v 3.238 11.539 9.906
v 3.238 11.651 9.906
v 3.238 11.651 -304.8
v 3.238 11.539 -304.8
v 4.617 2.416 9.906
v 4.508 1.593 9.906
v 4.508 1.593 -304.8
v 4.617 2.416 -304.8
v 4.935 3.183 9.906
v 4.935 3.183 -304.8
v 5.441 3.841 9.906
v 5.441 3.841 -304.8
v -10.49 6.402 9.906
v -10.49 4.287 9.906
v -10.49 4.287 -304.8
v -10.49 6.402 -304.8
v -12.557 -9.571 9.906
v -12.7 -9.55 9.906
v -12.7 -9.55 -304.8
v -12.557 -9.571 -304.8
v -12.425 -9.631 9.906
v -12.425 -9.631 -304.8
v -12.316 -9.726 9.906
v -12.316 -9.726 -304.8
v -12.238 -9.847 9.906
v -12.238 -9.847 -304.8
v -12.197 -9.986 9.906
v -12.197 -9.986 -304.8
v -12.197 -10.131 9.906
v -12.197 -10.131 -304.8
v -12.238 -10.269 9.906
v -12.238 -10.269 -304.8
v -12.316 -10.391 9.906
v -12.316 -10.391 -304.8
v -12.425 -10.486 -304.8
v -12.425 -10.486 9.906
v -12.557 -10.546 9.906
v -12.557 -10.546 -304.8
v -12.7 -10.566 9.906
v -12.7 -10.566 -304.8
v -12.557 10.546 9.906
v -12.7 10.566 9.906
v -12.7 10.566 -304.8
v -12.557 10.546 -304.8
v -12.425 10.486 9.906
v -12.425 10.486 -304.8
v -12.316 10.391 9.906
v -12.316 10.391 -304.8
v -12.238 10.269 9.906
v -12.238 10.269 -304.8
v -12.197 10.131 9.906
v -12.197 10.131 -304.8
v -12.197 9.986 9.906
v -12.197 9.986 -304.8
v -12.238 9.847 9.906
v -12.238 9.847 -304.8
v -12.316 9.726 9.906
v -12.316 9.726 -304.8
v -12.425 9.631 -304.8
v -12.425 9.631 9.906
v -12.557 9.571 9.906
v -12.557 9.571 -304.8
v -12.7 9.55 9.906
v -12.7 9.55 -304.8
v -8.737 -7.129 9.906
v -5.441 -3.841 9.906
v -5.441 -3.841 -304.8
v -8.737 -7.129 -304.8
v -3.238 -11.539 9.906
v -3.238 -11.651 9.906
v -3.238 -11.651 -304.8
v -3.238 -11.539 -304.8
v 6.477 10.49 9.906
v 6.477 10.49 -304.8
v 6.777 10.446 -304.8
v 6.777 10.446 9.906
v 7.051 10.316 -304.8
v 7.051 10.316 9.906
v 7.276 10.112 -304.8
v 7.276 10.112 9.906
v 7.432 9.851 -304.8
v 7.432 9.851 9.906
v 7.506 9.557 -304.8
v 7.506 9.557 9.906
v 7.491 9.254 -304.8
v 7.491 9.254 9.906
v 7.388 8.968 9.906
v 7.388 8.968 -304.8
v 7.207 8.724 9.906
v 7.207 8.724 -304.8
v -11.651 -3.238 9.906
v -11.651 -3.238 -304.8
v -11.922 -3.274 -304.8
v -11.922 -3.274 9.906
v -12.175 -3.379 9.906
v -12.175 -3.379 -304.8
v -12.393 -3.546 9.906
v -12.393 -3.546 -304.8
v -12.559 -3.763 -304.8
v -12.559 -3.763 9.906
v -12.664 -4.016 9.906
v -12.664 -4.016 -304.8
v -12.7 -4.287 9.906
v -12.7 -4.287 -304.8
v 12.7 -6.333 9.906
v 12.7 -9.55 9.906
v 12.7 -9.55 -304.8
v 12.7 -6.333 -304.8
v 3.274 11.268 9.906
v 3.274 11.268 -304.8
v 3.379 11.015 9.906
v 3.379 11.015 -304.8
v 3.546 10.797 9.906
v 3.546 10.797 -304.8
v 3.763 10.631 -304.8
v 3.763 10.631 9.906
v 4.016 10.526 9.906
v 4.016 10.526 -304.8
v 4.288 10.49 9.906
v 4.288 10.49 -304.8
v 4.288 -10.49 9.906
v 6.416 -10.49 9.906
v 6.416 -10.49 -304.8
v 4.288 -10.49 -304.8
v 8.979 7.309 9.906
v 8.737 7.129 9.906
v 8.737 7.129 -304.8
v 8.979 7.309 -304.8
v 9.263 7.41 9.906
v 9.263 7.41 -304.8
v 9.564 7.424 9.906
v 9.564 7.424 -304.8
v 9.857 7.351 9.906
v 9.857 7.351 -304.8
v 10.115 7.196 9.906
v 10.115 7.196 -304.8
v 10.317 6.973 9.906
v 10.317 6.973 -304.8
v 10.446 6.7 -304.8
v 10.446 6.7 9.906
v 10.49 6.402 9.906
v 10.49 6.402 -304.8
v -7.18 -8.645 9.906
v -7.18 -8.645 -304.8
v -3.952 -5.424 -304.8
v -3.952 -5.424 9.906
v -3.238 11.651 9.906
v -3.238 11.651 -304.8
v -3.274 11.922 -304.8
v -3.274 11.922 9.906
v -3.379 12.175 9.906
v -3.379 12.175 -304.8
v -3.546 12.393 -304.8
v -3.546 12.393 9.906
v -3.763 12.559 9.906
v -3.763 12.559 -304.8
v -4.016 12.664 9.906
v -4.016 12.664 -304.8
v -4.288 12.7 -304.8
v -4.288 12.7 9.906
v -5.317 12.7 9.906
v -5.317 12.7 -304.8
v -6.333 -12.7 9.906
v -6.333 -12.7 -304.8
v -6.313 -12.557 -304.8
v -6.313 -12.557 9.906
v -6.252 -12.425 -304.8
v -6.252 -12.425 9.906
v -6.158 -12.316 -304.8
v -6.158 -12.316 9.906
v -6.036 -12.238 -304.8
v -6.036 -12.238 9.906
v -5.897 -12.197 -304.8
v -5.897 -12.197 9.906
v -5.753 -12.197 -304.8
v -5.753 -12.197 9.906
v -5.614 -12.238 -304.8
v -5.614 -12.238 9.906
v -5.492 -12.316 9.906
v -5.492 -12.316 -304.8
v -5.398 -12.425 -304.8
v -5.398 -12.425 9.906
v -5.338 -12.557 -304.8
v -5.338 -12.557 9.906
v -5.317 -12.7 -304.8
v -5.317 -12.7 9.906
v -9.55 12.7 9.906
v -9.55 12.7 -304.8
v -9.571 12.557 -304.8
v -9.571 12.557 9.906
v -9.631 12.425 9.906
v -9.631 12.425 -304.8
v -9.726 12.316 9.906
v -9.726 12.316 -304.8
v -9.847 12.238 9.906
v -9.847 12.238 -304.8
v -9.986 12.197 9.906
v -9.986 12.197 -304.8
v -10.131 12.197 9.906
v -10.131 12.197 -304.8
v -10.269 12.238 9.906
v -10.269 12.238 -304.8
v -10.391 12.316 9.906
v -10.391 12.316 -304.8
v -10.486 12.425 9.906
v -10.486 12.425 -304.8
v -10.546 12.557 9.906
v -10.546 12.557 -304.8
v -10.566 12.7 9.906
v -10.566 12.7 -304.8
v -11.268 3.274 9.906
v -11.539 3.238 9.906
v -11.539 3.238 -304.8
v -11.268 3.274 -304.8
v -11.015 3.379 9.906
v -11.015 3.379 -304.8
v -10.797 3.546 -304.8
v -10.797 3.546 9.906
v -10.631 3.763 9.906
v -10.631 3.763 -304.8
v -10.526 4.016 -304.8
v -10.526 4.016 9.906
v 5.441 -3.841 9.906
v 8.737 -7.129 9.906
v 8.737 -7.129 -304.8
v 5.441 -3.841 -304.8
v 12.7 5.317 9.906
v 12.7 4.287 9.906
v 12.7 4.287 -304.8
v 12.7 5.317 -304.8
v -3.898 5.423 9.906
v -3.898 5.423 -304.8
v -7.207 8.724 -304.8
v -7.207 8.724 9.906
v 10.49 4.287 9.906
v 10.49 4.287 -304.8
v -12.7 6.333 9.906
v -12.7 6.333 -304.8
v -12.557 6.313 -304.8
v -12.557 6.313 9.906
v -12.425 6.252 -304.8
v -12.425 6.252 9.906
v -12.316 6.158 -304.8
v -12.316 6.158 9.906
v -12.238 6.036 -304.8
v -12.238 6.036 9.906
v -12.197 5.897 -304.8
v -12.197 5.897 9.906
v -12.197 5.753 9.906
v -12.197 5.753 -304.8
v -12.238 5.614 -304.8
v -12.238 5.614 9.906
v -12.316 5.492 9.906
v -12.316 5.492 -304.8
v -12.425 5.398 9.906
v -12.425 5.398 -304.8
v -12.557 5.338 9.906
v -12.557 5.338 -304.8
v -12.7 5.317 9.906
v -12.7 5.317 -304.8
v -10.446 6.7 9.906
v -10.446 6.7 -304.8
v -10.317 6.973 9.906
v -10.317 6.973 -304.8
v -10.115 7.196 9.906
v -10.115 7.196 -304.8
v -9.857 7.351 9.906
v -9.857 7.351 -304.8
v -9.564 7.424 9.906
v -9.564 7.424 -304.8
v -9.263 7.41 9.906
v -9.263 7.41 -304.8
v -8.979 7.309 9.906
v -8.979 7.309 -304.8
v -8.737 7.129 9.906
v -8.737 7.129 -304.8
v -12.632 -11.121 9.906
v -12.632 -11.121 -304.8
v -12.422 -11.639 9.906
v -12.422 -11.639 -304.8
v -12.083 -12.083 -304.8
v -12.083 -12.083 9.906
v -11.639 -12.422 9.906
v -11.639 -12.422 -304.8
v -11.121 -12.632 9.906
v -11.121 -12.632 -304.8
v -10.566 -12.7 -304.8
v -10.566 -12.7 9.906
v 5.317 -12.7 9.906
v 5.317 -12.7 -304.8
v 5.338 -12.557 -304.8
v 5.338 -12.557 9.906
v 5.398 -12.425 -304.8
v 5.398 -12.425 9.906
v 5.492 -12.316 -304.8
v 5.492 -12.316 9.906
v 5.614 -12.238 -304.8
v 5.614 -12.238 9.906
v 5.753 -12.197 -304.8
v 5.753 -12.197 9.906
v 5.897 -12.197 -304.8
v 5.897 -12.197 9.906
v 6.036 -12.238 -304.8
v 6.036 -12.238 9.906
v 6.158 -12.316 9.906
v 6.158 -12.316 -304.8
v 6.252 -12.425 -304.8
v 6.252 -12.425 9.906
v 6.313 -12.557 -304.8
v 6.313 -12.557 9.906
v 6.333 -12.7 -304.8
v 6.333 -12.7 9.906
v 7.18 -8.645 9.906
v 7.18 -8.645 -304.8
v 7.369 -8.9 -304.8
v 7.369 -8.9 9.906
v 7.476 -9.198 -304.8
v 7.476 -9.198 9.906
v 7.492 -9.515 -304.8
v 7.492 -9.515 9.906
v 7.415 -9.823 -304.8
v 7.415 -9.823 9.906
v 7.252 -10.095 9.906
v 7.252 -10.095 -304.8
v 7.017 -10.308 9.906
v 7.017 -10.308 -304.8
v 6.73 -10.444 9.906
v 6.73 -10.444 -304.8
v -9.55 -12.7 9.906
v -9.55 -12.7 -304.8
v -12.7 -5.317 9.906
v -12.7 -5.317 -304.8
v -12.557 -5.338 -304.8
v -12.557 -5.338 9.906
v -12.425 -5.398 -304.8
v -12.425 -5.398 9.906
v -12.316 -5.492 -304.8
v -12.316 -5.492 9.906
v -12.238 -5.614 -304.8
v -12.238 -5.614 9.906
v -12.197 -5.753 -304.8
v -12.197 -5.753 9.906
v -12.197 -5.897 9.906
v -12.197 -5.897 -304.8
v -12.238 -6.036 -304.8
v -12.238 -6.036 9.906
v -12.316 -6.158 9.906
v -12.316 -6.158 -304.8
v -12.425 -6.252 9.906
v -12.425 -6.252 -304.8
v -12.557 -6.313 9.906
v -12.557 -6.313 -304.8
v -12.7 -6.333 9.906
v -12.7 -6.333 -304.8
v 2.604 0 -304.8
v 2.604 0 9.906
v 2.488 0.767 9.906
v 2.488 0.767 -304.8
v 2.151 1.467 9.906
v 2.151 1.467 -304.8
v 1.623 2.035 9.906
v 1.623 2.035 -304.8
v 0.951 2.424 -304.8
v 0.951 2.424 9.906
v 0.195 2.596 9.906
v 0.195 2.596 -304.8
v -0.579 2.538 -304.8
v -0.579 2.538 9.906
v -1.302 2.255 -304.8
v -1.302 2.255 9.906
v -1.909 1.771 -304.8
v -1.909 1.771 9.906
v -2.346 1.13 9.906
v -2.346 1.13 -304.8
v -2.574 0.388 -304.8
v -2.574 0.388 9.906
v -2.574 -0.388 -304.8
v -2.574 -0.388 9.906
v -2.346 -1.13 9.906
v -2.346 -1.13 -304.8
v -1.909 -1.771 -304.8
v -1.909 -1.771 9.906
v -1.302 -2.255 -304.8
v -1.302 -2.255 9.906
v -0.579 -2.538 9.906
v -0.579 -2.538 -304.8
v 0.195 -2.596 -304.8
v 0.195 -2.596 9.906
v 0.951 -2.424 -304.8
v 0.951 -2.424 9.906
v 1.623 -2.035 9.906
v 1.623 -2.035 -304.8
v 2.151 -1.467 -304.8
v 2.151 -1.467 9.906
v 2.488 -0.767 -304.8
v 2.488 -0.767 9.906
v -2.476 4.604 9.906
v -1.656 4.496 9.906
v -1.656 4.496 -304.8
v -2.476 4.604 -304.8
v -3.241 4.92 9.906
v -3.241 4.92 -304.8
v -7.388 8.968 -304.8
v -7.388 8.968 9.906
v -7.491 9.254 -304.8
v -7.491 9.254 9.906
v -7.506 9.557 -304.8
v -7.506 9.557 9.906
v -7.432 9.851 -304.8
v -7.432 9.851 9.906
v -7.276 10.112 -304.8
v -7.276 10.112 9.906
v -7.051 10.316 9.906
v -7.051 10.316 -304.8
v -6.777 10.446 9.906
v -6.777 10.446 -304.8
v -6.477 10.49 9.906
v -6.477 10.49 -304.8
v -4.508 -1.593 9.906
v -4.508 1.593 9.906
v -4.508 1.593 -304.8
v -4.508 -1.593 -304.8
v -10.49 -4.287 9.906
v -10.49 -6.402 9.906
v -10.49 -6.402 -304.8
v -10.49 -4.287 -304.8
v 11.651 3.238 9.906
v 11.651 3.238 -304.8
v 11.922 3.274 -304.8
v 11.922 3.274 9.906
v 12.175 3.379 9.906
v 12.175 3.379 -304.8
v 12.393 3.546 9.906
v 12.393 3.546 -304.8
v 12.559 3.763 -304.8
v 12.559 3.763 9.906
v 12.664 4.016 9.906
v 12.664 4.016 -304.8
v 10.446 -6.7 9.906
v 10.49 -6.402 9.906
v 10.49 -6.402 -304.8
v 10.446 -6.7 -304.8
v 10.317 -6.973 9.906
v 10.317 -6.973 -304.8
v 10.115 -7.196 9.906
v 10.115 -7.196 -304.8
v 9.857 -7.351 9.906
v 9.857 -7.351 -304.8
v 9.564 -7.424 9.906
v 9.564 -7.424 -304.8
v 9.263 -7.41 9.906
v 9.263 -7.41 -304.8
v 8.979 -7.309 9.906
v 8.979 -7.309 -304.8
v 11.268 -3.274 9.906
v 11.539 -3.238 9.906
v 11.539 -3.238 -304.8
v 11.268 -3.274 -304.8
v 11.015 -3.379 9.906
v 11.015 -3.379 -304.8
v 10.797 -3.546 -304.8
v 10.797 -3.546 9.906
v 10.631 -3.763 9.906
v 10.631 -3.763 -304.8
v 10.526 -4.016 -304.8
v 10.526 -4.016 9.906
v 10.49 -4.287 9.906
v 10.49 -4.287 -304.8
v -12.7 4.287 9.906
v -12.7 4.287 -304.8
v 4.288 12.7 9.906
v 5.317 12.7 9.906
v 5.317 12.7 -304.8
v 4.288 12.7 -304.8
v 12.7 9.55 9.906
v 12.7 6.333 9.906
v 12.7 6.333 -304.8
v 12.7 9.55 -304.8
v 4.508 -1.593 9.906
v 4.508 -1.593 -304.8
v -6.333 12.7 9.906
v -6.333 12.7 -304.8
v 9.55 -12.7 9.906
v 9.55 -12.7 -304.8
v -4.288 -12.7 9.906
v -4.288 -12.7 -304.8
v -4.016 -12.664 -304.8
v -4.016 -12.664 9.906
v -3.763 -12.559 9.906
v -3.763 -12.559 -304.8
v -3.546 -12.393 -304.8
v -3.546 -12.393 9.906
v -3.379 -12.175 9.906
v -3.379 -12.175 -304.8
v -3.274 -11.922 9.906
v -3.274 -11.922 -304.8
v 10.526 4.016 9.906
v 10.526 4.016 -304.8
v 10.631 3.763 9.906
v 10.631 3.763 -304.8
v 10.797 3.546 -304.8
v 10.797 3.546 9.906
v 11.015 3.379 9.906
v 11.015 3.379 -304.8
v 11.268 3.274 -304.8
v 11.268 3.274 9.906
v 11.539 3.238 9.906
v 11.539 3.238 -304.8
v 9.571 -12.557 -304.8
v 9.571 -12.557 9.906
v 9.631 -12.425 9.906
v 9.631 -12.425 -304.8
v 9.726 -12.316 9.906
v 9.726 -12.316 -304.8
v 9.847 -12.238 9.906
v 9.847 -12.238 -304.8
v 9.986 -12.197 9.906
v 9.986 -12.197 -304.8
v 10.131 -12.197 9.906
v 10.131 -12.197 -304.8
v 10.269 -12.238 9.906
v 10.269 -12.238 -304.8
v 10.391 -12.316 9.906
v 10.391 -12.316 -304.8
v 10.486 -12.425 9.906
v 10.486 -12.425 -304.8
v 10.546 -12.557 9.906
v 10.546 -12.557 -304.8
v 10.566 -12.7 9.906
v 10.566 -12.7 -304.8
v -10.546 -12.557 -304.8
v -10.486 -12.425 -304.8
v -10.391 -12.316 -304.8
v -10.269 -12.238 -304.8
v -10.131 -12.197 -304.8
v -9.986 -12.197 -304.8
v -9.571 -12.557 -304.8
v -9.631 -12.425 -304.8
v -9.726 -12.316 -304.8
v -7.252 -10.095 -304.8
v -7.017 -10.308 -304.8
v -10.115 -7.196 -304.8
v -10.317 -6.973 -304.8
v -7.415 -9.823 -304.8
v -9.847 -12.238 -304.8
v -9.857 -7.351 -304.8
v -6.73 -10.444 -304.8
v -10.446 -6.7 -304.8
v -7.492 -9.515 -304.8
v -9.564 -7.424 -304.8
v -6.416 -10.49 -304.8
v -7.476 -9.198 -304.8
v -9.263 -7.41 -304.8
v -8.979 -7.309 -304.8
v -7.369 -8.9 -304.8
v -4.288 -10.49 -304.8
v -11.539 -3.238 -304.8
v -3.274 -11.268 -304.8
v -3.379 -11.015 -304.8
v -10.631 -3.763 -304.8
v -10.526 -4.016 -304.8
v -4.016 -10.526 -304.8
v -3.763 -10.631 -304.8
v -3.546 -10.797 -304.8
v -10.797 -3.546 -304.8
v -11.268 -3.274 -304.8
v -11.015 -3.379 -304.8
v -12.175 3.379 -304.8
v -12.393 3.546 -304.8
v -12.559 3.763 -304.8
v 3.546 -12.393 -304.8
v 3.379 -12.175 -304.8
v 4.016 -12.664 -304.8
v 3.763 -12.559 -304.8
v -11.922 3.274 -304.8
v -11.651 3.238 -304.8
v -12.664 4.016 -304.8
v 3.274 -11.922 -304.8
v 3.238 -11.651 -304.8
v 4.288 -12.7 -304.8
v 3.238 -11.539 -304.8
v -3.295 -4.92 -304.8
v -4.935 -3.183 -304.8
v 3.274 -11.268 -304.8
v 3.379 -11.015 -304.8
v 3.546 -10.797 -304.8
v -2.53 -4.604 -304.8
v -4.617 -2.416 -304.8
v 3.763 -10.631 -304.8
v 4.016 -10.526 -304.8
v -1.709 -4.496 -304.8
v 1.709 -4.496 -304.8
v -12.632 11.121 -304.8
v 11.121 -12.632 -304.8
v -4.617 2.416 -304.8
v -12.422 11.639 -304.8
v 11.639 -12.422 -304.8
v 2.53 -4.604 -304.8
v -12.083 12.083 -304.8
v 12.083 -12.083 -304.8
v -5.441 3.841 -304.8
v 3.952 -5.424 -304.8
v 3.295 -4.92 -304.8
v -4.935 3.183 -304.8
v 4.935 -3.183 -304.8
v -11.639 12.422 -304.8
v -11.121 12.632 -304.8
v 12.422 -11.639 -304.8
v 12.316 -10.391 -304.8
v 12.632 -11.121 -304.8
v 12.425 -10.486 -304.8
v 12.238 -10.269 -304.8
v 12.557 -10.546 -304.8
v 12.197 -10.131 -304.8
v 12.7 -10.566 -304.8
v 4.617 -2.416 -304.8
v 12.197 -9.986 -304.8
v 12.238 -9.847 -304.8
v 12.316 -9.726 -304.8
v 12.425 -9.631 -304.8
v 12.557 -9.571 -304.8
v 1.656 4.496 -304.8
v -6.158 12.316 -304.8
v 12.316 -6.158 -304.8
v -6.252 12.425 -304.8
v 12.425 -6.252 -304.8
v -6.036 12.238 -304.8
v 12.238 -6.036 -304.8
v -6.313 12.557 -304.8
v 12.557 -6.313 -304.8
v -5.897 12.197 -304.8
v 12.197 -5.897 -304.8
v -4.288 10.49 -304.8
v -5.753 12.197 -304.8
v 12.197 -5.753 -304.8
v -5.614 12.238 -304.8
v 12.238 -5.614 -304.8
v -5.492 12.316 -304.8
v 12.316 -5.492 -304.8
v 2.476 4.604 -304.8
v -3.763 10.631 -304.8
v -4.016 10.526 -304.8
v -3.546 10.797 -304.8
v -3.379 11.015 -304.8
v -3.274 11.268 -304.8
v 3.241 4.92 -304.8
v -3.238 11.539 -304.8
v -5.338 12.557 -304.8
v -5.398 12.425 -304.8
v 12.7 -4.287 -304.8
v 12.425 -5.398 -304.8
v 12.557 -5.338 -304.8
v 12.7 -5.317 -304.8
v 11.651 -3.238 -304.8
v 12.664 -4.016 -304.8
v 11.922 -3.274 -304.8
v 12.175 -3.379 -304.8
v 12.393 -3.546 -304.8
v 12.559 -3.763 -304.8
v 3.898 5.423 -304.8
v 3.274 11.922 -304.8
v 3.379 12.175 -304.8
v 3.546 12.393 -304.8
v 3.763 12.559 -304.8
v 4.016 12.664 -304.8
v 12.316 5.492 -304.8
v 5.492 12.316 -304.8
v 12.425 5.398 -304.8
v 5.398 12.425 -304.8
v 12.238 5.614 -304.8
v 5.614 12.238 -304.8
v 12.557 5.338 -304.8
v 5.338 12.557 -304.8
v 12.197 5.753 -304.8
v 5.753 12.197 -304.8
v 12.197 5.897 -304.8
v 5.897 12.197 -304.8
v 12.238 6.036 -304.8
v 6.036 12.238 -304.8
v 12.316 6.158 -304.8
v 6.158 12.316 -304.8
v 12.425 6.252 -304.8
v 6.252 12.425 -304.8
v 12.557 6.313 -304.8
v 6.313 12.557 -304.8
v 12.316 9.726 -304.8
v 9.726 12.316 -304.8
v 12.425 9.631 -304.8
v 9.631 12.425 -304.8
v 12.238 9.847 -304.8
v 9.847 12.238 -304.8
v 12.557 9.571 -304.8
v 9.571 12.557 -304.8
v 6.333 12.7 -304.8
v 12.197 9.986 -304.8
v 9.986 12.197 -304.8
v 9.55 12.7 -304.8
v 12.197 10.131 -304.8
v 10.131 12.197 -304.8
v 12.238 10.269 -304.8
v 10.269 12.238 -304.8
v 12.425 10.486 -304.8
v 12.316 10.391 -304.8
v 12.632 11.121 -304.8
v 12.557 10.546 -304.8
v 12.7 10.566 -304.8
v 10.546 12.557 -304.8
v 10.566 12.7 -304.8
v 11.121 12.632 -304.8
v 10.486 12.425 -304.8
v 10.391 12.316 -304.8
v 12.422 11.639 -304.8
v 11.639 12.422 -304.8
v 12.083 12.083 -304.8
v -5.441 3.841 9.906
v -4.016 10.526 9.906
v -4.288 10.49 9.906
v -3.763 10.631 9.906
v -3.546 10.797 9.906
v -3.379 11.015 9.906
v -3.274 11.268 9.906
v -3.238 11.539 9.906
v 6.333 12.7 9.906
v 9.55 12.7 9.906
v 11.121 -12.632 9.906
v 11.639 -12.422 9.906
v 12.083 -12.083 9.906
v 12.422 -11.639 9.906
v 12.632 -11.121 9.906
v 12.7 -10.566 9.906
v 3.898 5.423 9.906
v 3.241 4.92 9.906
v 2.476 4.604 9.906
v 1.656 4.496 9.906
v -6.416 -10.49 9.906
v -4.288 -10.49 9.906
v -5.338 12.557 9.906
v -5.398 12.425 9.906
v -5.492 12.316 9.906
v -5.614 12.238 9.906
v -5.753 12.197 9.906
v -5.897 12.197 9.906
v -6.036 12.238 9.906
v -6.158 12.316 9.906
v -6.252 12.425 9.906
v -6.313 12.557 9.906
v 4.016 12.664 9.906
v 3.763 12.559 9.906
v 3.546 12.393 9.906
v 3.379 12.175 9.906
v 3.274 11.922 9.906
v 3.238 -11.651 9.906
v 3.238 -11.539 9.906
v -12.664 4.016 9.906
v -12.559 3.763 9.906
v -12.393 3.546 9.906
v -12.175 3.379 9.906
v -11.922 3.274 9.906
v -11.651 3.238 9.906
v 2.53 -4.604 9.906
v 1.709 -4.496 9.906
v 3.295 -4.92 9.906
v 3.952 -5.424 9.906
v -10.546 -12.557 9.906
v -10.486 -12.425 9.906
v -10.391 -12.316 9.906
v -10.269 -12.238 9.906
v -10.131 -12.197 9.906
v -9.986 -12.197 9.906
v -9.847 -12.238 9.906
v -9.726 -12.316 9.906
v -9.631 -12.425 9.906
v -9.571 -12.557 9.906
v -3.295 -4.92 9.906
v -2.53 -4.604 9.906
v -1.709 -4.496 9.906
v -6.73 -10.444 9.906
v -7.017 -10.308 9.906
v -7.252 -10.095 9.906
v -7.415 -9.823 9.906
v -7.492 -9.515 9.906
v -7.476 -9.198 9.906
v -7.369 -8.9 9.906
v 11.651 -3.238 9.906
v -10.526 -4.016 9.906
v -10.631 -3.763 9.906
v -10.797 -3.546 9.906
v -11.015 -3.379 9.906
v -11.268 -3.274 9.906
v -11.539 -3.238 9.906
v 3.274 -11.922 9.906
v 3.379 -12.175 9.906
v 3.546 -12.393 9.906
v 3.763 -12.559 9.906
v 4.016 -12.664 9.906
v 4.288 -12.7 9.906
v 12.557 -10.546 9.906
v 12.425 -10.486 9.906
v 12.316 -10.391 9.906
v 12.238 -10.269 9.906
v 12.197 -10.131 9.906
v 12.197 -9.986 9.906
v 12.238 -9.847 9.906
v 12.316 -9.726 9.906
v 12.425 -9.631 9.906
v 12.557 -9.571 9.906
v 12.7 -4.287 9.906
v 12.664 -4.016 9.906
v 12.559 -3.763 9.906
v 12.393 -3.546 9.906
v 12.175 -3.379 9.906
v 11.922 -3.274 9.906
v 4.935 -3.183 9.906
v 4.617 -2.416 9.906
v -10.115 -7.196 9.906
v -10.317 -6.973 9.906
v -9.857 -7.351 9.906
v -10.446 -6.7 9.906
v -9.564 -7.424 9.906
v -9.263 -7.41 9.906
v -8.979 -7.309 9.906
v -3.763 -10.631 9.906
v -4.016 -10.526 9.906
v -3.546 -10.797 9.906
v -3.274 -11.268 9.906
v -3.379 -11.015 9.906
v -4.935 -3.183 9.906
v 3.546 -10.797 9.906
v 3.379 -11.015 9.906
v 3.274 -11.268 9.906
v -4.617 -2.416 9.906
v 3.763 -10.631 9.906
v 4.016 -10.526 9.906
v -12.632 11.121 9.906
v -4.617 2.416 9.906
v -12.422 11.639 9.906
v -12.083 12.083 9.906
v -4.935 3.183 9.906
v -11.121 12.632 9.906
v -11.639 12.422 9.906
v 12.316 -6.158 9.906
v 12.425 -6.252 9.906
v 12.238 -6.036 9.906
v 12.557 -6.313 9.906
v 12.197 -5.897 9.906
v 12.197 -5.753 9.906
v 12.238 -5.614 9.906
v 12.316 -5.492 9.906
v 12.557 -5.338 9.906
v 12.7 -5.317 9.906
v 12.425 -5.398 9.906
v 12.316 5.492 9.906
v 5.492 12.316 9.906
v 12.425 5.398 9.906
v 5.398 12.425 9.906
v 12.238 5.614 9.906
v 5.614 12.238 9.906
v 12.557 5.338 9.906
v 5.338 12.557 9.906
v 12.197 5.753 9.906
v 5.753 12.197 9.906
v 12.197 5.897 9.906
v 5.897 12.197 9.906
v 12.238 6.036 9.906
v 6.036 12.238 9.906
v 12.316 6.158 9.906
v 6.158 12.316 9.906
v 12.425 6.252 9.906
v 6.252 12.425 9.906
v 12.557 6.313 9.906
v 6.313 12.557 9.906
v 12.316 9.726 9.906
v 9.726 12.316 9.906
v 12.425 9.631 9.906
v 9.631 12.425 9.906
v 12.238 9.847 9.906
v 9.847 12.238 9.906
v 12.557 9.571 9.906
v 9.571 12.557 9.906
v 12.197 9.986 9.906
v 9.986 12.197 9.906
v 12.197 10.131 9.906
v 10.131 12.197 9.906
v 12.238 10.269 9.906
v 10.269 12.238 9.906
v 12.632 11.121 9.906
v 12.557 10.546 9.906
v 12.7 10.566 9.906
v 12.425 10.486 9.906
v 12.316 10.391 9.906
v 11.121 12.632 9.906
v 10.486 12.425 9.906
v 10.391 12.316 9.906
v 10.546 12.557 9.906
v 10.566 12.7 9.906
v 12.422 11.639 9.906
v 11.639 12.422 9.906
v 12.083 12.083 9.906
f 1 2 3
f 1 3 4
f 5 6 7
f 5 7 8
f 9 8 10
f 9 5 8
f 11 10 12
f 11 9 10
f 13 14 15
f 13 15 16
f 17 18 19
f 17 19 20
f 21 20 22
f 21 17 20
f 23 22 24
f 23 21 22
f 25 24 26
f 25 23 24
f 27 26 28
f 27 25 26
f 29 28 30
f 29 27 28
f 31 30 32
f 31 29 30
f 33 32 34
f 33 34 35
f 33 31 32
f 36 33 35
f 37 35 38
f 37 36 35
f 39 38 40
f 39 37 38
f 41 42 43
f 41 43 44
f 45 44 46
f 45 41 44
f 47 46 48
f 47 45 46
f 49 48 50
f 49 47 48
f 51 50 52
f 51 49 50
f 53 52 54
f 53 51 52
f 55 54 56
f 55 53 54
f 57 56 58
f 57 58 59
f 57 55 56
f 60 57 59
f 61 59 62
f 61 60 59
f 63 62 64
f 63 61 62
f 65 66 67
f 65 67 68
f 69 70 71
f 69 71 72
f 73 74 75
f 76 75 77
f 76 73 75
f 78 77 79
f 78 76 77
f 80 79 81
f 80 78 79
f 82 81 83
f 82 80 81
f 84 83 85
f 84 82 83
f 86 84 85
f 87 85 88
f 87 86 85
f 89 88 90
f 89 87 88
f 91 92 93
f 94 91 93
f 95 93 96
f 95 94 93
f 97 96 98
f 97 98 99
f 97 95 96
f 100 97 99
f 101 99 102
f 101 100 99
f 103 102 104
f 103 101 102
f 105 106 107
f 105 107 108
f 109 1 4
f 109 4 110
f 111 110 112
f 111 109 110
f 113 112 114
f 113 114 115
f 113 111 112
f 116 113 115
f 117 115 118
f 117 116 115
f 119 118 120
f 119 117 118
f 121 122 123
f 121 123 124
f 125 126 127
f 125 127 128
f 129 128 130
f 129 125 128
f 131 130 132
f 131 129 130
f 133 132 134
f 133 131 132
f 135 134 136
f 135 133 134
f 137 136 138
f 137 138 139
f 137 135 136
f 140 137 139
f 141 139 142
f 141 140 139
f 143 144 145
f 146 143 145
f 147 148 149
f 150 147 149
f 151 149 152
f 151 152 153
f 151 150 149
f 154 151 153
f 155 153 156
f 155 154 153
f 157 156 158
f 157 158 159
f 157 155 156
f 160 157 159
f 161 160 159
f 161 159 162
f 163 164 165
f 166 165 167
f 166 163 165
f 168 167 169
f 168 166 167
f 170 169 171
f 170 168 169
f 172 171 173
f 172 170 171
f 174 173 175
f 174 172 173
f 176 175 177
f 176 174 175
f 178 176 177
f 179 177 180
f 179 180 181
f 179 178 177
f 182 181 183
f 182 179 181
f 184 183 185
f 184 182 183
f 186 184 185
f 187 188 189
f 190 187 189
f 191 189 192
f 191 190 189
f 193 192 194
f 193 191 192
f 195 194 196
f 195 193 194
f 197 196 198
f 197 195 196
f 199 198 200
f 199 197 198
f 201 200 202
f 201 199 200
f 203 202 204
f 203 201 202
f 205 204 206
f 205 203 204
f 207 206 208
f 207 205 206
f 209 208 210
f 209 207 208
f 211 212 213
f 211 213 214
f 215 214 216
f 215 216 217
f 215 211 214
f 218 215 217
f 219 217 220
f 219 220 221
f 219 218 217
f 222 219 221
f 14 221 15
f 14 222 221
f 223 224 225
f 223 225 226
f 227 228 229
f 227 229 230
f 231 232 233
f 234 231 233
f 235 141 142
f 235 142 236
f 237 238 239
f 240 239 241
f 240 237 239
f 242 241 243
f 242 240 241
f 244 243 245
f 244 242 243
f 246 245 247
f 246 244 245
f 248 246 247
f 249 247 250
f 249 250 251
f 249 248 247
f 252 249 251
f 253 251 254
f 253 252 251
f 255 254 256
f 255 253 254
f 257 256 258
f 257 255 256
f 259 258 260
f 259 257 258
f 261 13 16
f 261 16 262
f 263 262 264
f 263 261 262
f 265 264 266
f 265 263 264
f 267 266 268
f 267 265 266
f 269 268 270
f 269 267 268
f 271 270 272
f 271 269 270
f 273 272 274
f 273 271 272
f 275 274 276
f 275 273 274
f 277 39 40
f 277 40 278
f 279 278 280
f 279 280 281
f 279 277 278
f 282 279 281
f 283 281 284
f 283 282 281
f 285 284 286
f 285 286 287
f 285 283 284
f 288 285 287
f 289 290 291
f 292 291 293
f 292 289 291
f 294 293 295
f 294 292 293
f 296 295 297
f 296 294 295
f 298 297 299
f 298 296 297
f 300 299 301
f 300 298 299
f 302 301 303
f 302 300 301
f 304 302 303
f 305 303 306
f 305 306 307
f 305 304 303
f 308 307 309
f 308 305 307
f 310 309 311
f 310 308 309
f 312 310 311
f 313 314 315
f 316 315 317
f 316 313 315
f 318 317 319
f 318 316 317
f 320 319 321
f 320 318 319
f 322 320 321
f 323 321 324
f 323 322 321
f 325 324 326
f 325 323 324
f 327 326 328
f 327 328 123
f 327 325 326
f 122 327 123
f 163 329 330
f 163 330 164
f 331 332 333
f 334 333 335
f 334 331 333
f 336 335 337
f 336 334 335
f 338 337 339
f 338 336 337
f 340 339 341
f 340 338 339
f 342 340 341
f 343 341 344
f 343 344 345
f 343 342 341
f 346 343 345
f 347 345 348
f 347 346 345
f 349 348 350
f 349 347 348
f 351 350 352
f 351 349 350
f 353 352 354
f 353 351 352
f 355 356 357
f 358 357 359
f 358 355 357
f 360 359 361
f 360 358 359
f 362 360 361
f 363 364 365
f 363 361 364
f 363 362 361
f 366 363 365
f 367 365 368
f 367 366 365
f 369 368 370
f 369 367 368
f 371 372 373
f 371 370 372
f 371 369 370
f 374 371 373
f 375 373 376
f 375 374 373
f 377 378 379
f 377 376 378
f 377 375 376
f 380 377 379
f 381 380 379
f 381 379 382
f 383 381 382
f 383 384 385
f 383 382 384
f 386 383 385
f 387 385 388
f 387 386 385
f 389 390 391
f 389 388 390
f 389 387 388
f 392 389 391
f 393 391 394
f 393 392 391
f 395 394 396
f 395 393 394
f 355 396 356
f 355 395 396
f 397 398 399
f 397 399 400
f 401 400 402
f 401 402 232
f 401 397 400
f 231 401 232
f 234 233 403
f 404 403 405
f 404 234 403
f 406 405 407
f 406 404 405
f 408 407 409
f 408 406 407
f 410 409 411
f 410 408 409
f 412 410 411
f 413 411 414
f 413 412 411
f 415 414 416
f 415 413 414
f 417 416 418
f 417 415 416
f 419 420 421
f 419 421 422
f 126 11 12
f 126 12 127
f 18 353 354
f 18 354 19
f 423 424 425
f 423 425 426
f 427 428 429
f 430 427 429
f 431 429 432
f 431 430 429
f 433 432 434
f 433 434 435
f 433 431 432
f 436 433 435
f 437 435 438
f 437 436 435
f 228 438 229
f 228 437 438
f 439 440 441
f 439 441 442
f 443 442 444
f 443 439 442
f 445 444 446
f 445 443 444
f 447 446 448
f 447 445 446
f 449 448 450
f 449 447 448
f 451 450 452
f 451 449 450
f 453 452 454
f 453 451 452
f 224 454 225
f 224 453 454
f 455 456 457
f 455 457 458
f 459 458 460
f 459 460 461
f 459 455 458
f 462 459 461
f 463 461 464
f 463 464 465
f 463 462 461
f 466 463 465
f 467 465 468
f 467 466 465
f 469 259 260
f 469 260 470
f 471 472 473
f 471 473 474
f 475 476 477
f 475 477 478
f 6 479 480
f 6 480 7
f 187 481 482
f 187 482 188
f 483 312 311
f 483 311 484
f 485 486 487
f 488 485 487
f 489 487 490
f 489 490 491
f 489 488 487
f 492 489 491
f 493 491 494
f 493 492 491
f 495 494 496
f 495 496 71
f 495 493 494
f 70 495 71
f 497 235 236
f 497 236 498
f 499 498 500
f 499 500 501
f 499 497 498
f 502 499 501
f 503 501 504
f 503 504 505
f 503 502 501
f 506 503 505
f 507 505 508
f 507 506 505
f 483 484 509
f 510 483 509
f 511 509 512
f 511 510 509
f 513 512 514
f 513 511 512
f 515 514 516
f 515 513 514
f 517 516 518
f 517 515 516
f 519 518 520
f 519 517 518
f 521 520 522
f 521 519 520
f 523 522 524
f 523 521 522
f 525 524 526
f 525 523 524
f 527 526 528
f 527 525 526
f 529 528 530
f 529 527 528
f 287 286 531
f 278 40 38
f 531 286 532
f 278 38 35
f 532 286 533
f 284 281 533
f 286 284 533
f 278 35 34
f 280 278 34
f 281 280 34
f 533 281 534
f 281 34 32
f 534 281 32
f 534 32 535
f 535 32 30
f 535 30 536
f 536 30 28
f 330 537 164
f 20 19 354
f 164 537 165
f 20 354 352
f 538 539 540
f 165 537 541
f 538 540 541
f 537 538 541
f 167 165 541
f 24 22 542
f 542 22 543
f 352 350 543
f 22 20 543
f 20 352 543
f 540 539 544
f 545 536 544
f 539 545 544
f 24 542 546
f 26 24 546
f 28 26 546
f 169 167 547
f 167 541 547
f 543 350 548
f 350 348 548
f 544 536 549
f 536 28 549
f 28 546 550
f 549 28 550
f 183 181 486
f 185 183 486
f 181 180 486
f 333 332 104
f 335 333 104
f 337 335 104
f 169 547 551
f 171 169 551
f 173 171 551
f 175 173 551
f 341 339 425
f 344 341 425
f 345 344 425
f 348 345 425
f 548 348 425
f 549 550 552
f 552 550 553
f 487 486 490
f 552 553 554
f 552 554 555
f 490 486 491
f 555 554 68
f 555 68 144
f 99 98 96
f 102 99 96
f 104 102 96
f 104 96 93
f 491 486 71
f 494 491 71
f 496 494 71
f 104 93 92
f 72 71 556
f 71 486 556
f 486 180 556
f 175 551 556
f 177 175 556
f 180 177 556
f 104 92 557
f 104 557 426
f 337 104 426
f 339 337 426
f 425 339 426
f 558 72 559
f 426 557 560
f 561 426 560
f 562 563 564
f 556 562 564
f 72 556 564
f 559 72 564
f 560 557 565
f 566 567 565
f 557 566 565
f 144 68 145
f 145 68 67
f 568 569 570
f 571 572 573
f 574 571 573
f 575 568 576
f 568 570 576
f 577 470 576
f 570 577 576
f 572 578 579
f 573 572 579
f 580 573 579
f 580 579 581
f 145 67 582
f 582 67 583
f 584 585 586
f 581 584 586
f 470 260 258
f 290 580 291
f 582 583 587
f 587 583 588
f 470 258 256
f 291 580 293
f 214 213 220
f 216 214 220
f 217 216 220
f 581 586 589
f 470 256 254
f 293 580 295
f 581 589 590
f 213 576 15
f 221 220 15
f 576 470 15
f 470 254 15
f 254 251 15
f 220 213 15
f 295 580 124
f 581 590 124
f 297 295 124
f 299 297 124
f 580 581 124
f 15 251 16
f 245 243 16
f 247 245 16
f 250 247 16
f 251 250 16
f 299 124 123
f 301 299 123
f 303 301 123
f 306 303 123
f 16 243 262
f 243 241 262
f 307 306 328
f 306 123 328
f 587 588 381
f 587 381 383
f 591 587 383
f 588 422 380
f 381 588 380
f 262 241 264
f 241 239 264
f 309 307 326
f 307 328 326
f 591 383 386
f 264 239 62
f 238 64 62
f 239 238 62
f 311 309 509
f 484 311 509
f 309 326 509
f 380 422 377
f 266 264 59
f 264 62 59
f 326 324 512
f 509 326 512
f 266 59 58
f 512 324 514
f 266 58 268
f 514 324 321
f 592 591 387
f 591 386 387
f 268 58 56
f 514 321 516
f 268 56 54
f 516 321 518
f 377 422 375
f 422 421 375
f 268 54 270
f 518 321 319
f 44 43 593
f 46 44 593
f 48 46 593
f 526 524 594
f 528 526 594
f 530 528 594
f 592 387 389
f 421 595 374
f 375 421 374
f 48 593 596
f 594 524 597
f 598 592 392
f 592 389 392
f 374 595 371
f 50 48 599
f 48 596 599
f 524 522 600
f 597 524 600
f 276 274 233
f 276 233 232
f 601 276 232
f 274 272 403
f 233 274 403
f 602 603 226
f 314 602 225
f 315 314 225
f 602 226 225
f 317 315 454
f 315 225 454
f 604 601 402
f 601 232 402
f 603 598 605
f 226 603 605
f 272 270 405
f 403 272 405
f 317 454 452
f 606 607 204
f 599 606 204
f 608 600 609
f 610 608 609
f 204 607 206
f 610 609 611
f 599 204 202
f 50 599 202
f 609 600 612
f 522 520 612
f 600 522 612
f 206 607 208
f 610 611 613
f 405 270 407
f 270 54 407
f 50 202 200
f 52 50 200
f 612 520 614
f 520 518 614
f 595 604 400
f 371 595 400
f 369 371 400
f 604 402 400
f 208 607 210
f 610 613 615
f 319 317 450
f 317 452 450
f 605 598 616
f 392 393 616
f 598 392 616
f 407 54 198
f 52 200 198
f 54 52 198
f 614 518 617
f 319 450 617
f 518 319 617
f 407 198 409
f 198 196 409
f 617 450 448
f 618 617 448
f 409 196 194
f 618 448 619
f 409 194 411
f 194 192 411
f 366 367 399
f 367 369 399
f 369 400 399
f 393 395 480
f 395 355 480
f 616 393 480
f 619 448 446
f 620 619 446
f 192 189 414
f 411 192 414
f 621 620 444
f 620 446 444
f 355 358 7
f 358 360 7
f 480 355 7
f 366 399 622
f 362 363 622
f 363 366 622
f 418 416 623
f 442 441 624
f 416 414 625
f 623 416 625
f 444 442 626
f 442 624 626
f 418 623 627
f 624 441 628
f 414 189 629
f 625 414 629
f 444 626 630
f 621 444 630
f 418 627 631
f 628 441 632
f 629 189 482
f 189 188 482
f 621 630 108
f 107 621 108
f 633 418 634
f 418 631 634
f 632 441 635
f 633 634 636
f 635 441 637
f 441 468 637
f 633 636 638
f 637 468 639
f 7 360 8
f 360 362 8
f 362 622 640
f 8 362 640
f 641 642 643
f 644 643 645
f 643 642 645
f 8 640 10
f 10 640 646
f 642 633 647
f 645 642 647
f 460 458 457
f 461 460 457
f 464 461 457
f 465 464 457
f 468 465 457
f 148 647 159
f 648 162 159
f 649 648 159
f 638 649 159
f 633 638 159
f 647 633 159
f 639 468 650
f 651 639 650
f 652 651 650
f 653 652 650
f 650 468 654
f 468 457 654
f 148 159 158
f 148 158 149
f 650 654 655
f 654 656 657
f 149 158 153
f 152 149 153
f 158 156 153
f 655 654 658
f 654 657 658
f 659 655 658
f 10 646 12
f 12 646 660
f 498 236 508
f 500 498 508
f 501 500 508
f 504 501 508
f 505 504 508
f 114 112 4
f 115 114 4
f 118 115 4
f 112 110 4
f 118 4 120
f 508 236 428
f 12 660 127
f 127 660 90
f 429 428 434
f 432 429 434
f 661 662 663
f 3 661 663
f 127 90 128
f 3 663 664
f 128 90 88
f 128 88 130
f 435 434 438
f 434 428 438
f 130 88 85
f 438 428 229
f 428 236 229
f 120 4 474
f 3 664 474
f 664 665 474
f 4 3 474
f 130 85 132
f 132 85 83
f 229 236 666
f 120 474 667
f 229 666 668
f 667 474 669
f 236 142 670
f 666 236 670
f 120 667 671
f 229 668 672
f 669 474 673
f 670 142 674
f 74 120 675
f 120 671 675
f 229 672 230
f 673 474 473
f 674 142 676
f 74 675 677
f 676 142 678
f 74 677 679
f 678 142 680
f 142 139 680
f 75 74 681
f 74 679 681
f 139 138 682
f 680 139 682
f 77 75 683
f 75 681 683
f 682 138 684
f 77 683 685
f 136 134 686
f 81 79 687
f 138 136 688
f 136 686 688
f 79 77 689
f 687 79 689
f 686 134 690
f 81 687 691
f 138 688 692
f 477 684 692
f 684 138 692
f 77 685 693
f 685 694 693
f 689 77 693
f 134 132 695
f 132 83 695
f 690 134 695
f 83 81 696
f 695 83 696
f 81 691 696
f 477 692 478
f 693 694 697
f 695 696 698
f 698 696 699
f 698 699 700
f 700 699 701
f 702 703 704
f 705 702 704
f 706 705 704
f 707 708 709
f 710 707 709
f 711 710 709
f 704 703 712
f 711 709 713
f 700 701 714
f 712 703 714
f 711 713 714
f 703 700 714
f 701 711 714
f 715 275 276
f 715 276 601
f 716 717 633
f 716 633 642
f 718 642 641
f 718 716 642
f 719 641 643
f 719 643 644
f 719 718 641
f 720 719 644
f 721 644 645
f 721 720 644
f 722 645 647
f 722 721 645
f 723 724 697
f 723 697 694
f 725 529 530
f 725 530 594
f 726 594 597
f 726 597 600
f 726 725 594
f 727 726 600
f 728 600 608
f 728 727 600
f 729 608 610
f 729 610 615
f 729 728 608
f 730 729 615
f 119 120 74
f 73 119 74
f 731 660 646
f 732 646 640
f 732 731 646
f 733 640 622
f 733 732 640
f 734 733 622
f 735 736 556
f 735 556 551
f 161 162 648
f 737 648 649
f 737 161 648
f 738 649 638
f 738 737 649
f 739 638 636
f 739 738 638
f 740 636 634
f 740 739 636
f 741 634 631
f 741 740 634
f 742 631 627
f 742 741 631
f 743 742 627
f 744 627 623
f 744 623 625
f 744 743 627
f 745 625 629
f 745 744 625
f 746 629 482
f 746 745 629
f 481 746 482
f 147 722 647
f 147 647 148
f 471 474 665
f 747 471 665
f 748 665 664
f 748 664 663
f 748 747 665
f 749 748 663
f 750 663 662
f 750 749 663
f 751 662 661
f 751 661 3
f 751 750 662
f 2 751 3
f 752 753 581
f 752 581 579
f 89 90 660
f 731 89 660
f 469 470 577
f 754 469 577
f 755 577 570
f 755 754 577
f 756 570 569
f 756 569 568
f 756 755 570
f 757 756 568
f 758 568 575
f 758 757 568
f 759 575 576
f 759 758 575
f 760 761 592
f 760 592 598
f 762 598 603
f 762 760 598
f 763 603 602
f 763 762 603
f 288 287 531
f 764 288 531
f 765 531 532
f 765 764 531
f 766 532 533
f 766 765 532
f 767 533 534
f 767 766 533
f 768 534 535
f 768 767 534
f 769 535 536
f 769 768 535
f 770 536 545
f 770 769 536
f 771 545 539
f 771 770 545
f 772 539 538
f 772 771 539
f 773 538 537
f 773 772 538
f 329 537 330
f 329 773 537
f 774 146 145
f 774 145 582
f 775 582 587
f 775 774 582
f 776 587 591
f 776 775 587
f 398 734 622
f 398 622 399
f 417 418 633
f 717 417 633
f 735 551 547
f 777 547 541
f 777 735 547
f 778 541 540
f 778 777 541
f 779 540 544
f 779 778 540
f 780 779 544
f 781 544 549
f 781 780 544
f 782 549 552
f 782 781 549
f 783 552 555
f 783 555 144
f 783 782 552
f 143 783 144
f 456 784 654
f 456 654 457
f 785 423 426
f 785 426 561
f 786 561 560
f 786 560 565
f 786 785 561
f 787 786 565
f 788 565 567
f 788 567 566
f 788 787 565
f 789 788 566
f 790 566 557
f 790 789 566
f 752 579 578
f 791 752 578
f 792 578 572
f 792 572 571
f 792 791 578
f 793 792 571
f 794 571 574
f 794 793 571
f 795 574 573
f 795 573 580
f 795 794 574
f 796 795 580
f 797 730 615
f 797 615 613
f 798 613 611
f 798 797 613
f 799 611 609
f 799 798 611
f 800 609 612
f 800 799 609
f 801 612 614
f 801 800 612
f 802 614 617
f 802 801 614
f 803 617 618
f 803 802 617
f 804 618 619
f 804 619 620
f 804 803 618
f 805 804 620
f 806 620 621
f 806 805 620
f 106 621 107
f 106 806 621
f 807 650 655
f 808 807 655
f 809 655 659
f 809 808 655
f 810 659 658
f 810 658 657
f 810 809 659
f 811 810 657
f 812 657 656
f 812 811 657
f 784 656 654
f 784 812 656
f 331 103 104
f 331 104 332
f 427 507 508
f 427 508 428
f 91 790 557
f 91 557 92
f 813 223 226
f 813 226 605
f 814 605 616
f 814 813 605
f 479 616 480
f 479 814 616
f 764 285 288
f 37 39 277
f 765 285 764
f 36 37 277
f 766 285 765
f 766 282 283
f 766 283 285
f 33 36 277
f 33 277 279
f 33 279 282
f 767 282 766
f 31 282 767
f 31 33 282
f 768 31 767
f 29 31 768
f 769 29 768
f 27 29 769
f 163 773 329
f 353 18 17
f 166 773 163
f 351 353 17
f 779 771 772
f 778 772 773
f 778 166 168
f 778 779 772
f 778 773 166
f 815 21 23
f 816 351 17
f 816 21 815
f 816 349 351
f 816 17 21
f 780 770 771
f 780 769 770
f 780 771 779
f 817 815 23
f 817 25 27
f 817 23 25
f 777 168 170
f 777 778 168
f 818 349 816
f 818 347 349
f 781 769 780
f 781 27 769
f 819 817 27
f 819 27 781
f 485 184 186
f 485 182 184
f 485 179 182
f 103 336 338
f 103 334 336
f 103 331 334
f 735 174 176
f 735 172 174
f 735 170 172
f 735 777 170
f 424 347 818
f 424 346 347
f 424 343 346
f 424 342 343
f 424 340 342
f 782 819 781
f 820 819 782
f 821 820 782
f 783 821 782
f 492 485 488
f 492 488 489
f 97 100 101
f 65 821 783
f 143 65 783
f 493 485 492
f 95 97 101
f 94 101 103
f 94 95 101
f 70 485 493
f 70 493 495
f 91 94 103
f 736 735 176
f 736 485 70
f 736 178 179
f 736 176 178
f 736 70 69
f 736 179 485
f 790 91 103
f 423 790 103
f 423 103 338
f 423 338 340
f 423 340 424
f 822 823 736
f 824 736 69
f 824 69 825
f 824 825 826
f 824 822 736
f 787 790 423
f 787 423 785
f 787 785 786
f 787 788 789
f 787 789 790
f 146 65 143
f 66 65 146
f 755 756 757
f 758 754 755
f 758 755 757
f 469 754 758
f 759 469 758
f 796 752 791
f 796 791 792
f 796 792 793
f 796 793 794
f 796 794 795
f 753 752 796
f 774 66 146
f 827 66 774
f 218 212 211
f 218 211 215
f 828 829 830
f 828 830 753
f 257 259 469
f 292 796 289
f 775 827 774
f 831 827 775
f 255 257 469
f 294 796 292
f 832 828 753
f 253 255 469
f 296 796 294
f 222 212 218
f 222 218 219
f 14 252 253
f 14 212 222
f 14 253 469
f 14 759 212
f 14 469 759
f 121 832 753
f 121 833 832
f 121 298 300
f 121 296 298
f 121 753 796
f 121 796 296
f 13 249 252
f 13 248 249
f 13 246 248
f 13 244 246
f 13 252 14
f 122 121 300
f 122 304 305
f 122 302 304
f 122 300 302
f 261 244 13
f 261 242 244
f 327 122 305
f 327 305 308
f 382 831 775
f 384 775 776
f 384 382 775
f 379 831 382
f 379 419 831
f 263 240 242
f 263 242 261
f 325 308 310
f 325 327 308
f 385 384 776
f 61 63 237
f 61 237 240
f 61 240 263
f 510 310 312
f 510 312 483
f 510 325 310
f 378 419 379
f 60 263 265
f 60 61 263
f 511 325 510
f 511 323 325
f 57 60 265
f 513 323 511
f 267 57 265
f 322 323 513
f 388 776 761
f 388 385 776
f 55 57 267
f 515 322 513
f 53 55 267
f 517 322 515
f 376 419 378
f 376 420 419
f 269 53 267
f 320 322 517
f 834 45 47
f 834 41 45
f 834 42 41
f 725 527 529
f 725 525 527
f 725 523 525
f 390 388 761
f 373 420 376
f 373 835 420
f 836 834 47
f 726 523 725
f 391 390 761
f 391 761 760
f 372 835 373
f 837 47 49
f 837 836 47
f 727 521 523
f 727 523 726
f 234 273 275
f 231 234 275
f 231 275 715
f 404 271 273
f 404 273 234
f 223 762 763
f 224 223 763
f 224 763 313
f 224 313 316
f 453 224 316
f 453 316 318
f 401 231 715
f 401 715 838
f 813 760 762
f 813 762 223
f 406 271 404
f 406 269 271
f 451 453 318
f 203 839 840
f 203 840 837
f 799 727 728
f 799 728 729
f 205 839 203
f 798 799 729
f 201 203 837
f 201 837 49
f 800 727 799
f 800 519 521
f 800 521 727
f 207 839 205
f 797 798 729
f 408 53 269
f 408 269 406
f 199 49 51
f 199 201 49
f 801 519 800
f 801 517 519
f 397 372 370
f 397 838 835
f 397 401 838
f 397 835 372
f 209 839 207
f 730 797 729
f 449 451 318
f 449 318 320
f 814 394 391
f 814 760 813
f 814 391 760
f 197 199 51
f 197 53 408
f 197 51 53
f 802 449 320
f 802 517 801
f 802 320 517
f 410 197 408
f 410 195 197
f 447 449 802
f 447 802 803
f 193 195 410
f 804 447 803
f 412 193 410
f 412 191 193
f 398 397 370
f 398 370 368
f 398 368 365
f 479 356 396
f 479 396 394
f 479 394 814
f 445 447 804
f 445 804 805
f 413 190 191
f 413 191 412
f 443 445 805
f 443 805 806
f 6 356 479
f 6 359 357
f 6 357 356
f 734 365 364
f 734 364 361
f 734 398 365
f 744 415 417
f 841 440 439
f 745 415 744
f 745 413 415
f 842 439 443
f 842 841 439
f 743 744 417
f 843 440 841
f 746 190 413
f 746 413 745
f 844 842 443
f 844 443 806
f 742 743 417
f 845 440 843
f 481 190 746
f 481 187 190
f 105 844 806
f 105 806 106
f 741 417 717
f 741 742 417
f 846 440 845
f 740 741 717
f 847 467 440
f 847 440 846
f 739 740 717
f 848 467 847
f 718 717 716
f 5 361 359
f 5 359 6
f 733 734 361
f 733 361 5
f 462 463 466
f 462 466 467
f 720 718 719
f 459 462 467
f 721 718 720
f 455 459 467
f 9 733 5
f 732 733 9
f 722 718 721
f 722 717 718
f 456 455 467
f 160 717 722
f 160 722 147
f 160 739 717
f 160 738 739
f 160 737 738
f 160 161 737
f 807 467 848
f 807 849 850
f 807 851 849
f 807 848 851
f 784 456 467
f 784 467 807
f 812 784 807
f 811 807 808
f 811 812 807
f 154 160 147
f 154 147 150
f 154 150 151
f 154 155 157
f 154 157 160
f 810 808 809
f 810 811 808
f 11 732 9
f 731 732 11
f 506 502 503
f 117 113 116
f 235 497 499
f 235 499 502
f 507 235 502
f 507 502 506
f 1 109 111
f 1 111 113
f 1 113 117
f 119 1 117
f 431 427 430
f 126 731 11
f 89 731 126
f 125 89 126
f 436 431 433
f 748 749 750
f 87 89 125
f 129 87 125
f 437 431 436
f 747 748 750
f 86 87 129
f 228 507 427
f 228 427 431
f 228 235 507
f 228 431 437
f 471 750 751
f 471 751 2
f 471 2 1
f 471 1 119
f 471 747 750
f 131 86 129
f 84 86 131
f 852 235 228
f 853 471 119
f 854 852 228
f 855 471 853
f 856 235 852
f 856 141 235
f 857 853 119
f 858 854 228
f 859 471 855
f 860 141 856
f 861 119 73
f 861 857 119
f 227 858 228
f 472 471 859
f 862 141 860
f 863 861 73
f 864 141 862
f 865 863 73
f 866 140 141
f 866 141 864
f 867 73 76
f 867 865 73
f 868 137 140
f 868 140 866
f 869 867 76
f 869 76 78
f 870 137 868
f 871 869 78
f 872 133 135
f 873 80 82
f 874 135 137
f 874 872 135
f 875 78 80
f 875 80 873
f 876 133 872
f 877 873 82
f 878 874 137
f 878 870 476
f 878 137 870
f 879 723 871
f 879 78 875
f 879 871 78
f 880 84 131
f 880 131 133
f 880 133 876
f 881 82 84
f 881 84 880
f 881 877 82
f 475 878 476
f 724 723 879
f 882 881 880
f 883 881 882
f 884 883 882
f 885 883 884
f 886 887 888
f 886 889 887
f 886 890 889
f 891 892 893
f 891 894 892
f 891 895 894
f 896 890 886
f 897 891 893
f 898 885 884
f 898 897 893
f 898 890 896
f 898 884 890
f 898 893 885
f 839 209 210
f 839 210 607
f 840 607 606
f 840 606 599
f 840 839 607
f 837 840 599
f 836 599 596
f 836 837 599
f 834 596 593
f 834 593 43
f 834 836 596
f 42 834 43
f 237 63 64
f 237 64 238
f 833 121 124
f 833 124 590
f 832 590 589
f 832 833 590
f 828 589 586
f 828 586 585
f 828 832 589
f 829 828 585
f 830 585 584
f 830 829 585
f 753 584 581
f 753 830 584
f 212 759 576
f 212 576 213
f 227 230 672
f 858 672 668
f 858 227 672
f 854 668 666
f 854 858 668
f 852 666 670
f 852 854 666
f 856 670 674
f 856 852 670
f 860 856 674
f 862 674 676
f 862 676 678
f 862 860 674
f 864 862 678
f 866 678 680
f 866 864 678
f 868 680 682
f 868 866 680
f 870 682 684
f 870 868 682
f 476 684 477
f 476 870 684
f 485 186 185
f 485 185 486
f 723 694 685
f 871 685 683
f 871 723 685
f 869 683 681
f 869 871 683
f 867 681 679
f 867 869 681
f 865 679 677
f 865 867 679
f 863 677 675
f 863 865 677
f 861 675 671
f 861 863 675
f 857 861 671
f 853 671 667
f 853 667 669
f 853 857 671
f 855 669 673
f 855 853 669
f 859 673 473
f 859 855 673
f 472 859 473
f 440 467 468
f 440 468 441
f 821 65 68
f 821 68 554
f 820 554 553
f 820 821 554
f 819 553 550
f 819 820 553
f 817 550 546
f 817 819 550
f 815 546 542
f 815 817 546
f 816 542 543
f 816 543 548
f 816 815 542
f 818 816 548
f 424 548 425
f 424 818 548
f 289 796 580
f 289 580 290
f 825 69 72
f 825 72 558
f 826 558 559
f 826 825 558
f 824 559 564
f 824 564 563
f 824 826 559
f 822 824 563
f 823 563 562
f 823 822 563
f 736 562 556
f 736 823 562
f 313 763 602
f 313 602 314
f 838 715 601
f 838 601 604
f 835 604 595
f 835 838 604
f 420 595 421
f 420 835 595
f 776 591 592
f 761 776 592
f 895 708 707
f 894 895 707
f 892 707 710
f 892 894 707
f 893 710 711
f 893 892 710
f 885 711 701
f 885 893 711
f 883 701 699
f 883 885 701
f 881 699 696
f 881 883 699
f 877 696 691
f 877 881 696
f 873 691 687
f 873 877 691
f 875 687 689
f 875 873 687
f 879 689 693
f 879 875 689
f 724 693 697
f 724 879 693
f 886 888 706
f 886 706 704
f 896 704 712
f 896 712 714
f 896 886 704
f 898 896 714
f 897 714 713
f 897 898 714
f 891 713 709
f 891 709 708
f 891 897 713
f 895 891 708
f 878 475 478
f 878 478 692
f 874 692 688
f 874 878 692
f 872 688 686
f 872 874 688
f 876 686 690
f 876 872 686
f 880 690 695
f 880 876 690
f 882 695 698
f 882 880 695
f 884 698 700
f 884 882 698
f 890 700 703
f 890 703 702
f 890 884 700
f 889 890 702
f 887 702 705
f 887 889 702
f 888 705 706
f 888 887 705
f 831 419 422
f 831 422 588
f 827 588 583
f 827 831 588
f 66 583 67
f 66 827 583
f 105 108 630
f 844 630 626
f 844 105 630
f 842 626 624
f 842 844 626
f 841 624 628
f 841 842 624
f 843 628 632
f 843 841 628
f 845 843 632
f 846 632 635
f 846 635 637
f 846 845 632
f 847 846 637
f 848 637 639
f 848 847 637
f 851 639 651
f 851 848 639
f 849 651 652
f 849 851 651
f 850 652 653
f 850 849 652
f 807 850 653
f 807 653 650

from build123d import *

# Parameters (mm, degrees)
SKETCH1_R           = 2.6035
BOSS_EXTRUDE1_DEPTH = 304.8
SKETCH2_W           = 54.534078776
SKETCH2_H           = 52.309705205
CUT_EXTRUDE1_DEPTH  = 294.894


with BuildPart() as part:
    # Sketch1 → Boss-Extrude1 (new body, symmetric)
    with BuildSketch(Plane.XY):
        with BuildLine():
            Line((-7.179650497, -8.645192506), (-3.952270251, -5.423690499))
            ThreePointArc((-3.952270251, -5.423690499), (-2.922936451, -4.736929036), (-1.709253557, -4.4958))
            Line((-1.709253557, -4.4958), (1.709253557, -4.4958))
            ThreePointArc((1.709253557, -4.4958), (2.922936451, -4.736929036), (3.952270251, -5.423690499))
            Line((3.952270251, -5.423690499), (7.179650497, -8.645192506))
            ThreePointArc((7.179650497, -8.645192506), (7.41473083, -9.822813117), (6.416408329, -10.4902))
            Line((6.416408329, -10.4902), (4.287512407, -10.4902))
            ThreePointArc((4.287512407, -10.4902), (3.54574862, -10.79744862), (3.2385, -11.539212407))
            Line((3.2385, -11.539212407), (3.2385, -11.650987593))
            ThreePointArc((3.2385, -11.650987593), (3.54574862, -12.39275138), (4.287512407, -12.7))
            Line((4.287512407, -12.7), (5.317126718, -12.7))
            ThreePointArc((5.317126718, -12.7), (5.825126718, -12.192), (6.333126718, -12.7))
            Line((6.333126718, -12.7), (9.550443118, -12.7))
            ThreePointArc((9.550443118, -12.7), (10.058366869, -12.192000006), (10.566443095, -12.699847501))
            ThreePointArc((10.566443095, -12.699847501), (12.082537762, -12.08250727), (12.699846982, -10.566399977))
            ThreePointArc((12.699846982, -10.566399977), (12.192000006, -10.058323491), (12.7, -9.5504))
            Line((12.7, -9.5504), (12.7, -6.3330836))
            ThreePointArc((12.7, -6.3330836), (12.192, -5.8250836), (12.7, -5.3170836))
            Line((12.7, -5.3170836), (12.7, -4.287469289))
            ThreePointArc((12.7, -4.287469289), (12.39275138, -3.545705502), (11.650987593, -3.238456882))
            Line((11.650987593, -3.238456882), (11.539212407, -3.238456882))
            ThreePointArc((11.539212407, -3.238456882), (10.79744862, -3.545705502), (10.4902, -4.287469289))
            Line((10.4902, -4.287469289), (10.4902, -6.402089023))
            ThreePointArc((10.4902, -6.402089023), (9.856505071, -7.351067942), (8.737131347, -7.129408934))
            Line((8.737131347, -7.129408934), (5.441005833, -3.840816462))
            ThreePointArc((5.441005833, -3.840816462), (4.750877967, -2.809883091), (4.5085, -1.593185507))
            Line((4.5085, -1.593185507), (4.5085, 1.593185507))
            ThreePointArc((4.5085, 1.593185507), (4.750877967, 2.809883091), (5.441005833, 3.840816462))
            Line((5.441005833, 3.840816462), (8.737131347, 7.129408934))
            ThreePointArc((8.737131347, 7.129408934), (9.856505071, 7.351067942), (10.4902, 6.402089023))
            Line((10.4902, 6.402089023), (10.4902, 4.287469289))
            ThreePointArc((10.4902, 4.287469289), (10.79744862, 3.545705502), (11.539212407, 3.238456882))
            Line((11.539212407, 3.238456882), (11.650987593, 3.238456882))
            ThreePointArc((11.650987593, 3.238456882), (12.39275138, 3.545705502), (12.7, 4.287469289))
            Line((12.7, 4.287469289), (12.7, 5.3170836))
            ThreePointArc((12.7, 5.3170836), (12.192, 5.8250836), (12.7, 6.3330836))
            Line((12.7, 6.3330836), (12.7, 9.5504))
            ThreePointArc((12.7, 9.5504), (12.192000006, 10.058323491), (12.699846982, 10.566399977))
            ThreePointArc((12.699846982, 10.566399977), (12.082537762, 12.08250727), (10.566443095, 12.699847501))
            ThreePointArc((10.566443095, 12.699847501), (10.058366869, 12.192000006), (9.550443118, 12.7))
            Line((9.550443118, 12.7), (6.333126718, 12.7))
            ThreePointArc((6.333126718, 12.7), (5.825126718, 12.192), (5.317126718, 12.7))
            Line((5.317126718, 12.7), (4.287512407, 12.7))
            ThreePointArc((4.287512407, 12.7), (3.54574862, 12.39275138), (3.2385, 11.650987593))
            Line((3.2385, 11.650987593), (3.2385, 11.539212407))
            ThreePointArc((3.2385, 11.539212407), (3.54574862, 10.79744862), (4.287512407, 10.4902))
            Line((4.287512407, 10.4902), (6.476788598, 10.4902))
            ThreePointArc((6.476788598, 10.4902), (7.432222385, 9.85140422), (7.207036008, 8.724370562))
            Line((7.207036008, 8.724370562), (3.898272566, 5.423169045))
            ThreePointArc((3.898272566, 5.423169045), (2.869120213, 4.736787962), (1.655778399, 4.4958))
            Line((1.655778399, 4.4958), (-1.655778399, 4.4958))
            ThreePointArc((-1.655778399, 4.4958), (-2.869120213, 4.736787962), (-3.898272566, 5.423169045))
            Line((-3.898272566, 5.423169045), (-7.207036008, 8.724370562))
            ThreePointArc((-7.207036008, 8.724370562), (-7.432222385, 9.85140422), (-6.476788598, 10.4902))
            Line((-6.476788598, 10.4902), (-4.287512407, 10.4902))
            ThreePointArc((-4.287512407, 10.4902), (-3.54574862, 10.79744862), (-3.2385, 11.539212407))
            Line((-3.2385, 11.539212407), (-3.2385, 11.650987593))
            ThreePointArc((-3.2385, 11.650987593), (-3.54574862, 12.39275138), (-4.287512407, 12.7))
            Line((-4.287512407, 12.7), (-5.317126718, 12.7))
            ThreePointArc((-5.317126718, 12.7), (-5.825126718, 12.192), (-6.333126718, 12.7))
            Line((-6.333126718, 12.7), (-9.550443118, 12.7))
            ThreePointArc((-9.550443118, 12.7), (-10.058366869, 12.192000006), (-10.566443095, 12.699847501))
            ThreePointArc((-10.566443095, 12.699847501), (-12.082537762, 12.08250727), (-12.699846982, 10.566399977))
            ThreePointArc((-12.699846982, 10.566399977), (-12.192000006, 10.058323491), (-12.7, 9.5504))
            Line((-12.7, 9.5504), (-12.7, 6.3330836))
            ThreePointArc((-12.7, 6.3330836), (-12.192, 5.8250836), (-12.7, 5.3170836))
            Line((-12.7, 5.3170836), (-12.7, 4.287469289))
            ThreePointArc((-12.7, 4.287469289), (-12.39275138, 3.545705502), (-11.650987593, 3.238456882))
            Line((-11.650987593, 3.238456882), (-11.539212407, 3.238456882))
            ThreePointArc((-11.539212407, 3.238456882), (-10.79744862, 3.545705502), (-10.4902, 4.287469289))
            Line((-10.4902, 4.287469289), (-10.4902, 6.402089023))
            ThreePointArc((-10.4902, 6.402089023), (-9.856505071, 7.351067942), (-8.737131347, 7.129408934))
            Line((-8.737131347, 7.129408934), (-5.441005833, 3.840816462))
            ThreePointArc((-5.441005833, 3.840816462), (-4.750877967, 2.809883091), (-4.5085, 1.593185507))
            Line((-4.5085, 1.593185507), (-4.5085, -1.593185507))
            ThreePointArc((-4.5085, -1.593185507), (-4.750877967, -2.809883091), (-5.441005833, -3.840816462))
            Line((-5.441005833, -3.840816462), (-8.737131347, -7.129408934))
            ThreePointArc((-8.737131347, -7.129408934), (-9.856505071, -7.351067942), (-10.4902, -6.402089023))
            Line((-10.4902, -6.402089023), (-10.4902, -4.287469289))
            ThreePointArc((-10.4902, -4.287469289), (-10.79744862, -3.545705502), (-11.539212407, -3.238456882))
            Line((-11.539212407, -3.238456882), (-11.650987593, -3.238456882))
            ThreePointArc((-11.650987593, -3.238456882), (-12.39275138, -3.545705502), (-12.7, -4.287469289))
            Line((-12.7, -4.287469289), (-12.7, -5.3170836))
            ThreePointArc((-12.7, -5.3170836), (-12.192, -5.8250836), (-12.7, -6.3330836))
            Line((-12.7, -6.3330836), (-12.7, -9.5504))
            ThreePointArc((-12.7, -9.5504), (-12.192000006, -10.058323491), (-12.699846982, -10.566399977))
            ThreePointArc((-12.699846982, -10.566399977), (-12.082537762, -12.08250727), (-10.566443095, -12.699847501))
            ThreePointArc((-10.566443095, -12.699847501), (-10.058366869, -12.192000006), (-9.550443118, -12.7))
            Line((-9.550443118, -12.7), (-6.333126718, -12.7))
            ThreePointArc((-6.333126718, -12.7), (-5.825126718, -12.192), (-5.317126718, -12.7))
            Line((-5.317126718, -12.7), (-4.287512407, -12.7))
            ThreePointArc((-4.287512407, -12.7), (-3.54574862, -12.39275138), (-3.2385, -11.650987593))
            Line((-3.2385, -11.650987593), (-3.2385, -11.539212407))
            ThreePointArc((-3.2385, -11.539212407), (-3.54574862, -10.79744862), (-4.287512407, -10.4902))
            Line((-4.287512407, -10.4902), (-6.416408329, -10.4902))
            ThreePointArc((-6.416408329, -10.4902), (-7.41473083, -9.822813117), (-7.179650497, -8.645192506))
        make_face()
        Circle(SKETCH1_R, mode=Mode.SUBTRACT)
    extrude(amount=BOSS_EXTRUDE1_DEPTH, both=True)

    # Sketch2 → Cut-Extrude1 (cut)
    with BuildSketch(Plane.XY.offset(304.8)):
        with Locations((3.588199908, -2.803361197)):
            Rectangle(SKETCH2_W, SKETCH2_H)
    extrude(amount=-CUT_EXTRUDE1_DEPTH, mode=Mode.SUBTRACT)


solid = part.part
